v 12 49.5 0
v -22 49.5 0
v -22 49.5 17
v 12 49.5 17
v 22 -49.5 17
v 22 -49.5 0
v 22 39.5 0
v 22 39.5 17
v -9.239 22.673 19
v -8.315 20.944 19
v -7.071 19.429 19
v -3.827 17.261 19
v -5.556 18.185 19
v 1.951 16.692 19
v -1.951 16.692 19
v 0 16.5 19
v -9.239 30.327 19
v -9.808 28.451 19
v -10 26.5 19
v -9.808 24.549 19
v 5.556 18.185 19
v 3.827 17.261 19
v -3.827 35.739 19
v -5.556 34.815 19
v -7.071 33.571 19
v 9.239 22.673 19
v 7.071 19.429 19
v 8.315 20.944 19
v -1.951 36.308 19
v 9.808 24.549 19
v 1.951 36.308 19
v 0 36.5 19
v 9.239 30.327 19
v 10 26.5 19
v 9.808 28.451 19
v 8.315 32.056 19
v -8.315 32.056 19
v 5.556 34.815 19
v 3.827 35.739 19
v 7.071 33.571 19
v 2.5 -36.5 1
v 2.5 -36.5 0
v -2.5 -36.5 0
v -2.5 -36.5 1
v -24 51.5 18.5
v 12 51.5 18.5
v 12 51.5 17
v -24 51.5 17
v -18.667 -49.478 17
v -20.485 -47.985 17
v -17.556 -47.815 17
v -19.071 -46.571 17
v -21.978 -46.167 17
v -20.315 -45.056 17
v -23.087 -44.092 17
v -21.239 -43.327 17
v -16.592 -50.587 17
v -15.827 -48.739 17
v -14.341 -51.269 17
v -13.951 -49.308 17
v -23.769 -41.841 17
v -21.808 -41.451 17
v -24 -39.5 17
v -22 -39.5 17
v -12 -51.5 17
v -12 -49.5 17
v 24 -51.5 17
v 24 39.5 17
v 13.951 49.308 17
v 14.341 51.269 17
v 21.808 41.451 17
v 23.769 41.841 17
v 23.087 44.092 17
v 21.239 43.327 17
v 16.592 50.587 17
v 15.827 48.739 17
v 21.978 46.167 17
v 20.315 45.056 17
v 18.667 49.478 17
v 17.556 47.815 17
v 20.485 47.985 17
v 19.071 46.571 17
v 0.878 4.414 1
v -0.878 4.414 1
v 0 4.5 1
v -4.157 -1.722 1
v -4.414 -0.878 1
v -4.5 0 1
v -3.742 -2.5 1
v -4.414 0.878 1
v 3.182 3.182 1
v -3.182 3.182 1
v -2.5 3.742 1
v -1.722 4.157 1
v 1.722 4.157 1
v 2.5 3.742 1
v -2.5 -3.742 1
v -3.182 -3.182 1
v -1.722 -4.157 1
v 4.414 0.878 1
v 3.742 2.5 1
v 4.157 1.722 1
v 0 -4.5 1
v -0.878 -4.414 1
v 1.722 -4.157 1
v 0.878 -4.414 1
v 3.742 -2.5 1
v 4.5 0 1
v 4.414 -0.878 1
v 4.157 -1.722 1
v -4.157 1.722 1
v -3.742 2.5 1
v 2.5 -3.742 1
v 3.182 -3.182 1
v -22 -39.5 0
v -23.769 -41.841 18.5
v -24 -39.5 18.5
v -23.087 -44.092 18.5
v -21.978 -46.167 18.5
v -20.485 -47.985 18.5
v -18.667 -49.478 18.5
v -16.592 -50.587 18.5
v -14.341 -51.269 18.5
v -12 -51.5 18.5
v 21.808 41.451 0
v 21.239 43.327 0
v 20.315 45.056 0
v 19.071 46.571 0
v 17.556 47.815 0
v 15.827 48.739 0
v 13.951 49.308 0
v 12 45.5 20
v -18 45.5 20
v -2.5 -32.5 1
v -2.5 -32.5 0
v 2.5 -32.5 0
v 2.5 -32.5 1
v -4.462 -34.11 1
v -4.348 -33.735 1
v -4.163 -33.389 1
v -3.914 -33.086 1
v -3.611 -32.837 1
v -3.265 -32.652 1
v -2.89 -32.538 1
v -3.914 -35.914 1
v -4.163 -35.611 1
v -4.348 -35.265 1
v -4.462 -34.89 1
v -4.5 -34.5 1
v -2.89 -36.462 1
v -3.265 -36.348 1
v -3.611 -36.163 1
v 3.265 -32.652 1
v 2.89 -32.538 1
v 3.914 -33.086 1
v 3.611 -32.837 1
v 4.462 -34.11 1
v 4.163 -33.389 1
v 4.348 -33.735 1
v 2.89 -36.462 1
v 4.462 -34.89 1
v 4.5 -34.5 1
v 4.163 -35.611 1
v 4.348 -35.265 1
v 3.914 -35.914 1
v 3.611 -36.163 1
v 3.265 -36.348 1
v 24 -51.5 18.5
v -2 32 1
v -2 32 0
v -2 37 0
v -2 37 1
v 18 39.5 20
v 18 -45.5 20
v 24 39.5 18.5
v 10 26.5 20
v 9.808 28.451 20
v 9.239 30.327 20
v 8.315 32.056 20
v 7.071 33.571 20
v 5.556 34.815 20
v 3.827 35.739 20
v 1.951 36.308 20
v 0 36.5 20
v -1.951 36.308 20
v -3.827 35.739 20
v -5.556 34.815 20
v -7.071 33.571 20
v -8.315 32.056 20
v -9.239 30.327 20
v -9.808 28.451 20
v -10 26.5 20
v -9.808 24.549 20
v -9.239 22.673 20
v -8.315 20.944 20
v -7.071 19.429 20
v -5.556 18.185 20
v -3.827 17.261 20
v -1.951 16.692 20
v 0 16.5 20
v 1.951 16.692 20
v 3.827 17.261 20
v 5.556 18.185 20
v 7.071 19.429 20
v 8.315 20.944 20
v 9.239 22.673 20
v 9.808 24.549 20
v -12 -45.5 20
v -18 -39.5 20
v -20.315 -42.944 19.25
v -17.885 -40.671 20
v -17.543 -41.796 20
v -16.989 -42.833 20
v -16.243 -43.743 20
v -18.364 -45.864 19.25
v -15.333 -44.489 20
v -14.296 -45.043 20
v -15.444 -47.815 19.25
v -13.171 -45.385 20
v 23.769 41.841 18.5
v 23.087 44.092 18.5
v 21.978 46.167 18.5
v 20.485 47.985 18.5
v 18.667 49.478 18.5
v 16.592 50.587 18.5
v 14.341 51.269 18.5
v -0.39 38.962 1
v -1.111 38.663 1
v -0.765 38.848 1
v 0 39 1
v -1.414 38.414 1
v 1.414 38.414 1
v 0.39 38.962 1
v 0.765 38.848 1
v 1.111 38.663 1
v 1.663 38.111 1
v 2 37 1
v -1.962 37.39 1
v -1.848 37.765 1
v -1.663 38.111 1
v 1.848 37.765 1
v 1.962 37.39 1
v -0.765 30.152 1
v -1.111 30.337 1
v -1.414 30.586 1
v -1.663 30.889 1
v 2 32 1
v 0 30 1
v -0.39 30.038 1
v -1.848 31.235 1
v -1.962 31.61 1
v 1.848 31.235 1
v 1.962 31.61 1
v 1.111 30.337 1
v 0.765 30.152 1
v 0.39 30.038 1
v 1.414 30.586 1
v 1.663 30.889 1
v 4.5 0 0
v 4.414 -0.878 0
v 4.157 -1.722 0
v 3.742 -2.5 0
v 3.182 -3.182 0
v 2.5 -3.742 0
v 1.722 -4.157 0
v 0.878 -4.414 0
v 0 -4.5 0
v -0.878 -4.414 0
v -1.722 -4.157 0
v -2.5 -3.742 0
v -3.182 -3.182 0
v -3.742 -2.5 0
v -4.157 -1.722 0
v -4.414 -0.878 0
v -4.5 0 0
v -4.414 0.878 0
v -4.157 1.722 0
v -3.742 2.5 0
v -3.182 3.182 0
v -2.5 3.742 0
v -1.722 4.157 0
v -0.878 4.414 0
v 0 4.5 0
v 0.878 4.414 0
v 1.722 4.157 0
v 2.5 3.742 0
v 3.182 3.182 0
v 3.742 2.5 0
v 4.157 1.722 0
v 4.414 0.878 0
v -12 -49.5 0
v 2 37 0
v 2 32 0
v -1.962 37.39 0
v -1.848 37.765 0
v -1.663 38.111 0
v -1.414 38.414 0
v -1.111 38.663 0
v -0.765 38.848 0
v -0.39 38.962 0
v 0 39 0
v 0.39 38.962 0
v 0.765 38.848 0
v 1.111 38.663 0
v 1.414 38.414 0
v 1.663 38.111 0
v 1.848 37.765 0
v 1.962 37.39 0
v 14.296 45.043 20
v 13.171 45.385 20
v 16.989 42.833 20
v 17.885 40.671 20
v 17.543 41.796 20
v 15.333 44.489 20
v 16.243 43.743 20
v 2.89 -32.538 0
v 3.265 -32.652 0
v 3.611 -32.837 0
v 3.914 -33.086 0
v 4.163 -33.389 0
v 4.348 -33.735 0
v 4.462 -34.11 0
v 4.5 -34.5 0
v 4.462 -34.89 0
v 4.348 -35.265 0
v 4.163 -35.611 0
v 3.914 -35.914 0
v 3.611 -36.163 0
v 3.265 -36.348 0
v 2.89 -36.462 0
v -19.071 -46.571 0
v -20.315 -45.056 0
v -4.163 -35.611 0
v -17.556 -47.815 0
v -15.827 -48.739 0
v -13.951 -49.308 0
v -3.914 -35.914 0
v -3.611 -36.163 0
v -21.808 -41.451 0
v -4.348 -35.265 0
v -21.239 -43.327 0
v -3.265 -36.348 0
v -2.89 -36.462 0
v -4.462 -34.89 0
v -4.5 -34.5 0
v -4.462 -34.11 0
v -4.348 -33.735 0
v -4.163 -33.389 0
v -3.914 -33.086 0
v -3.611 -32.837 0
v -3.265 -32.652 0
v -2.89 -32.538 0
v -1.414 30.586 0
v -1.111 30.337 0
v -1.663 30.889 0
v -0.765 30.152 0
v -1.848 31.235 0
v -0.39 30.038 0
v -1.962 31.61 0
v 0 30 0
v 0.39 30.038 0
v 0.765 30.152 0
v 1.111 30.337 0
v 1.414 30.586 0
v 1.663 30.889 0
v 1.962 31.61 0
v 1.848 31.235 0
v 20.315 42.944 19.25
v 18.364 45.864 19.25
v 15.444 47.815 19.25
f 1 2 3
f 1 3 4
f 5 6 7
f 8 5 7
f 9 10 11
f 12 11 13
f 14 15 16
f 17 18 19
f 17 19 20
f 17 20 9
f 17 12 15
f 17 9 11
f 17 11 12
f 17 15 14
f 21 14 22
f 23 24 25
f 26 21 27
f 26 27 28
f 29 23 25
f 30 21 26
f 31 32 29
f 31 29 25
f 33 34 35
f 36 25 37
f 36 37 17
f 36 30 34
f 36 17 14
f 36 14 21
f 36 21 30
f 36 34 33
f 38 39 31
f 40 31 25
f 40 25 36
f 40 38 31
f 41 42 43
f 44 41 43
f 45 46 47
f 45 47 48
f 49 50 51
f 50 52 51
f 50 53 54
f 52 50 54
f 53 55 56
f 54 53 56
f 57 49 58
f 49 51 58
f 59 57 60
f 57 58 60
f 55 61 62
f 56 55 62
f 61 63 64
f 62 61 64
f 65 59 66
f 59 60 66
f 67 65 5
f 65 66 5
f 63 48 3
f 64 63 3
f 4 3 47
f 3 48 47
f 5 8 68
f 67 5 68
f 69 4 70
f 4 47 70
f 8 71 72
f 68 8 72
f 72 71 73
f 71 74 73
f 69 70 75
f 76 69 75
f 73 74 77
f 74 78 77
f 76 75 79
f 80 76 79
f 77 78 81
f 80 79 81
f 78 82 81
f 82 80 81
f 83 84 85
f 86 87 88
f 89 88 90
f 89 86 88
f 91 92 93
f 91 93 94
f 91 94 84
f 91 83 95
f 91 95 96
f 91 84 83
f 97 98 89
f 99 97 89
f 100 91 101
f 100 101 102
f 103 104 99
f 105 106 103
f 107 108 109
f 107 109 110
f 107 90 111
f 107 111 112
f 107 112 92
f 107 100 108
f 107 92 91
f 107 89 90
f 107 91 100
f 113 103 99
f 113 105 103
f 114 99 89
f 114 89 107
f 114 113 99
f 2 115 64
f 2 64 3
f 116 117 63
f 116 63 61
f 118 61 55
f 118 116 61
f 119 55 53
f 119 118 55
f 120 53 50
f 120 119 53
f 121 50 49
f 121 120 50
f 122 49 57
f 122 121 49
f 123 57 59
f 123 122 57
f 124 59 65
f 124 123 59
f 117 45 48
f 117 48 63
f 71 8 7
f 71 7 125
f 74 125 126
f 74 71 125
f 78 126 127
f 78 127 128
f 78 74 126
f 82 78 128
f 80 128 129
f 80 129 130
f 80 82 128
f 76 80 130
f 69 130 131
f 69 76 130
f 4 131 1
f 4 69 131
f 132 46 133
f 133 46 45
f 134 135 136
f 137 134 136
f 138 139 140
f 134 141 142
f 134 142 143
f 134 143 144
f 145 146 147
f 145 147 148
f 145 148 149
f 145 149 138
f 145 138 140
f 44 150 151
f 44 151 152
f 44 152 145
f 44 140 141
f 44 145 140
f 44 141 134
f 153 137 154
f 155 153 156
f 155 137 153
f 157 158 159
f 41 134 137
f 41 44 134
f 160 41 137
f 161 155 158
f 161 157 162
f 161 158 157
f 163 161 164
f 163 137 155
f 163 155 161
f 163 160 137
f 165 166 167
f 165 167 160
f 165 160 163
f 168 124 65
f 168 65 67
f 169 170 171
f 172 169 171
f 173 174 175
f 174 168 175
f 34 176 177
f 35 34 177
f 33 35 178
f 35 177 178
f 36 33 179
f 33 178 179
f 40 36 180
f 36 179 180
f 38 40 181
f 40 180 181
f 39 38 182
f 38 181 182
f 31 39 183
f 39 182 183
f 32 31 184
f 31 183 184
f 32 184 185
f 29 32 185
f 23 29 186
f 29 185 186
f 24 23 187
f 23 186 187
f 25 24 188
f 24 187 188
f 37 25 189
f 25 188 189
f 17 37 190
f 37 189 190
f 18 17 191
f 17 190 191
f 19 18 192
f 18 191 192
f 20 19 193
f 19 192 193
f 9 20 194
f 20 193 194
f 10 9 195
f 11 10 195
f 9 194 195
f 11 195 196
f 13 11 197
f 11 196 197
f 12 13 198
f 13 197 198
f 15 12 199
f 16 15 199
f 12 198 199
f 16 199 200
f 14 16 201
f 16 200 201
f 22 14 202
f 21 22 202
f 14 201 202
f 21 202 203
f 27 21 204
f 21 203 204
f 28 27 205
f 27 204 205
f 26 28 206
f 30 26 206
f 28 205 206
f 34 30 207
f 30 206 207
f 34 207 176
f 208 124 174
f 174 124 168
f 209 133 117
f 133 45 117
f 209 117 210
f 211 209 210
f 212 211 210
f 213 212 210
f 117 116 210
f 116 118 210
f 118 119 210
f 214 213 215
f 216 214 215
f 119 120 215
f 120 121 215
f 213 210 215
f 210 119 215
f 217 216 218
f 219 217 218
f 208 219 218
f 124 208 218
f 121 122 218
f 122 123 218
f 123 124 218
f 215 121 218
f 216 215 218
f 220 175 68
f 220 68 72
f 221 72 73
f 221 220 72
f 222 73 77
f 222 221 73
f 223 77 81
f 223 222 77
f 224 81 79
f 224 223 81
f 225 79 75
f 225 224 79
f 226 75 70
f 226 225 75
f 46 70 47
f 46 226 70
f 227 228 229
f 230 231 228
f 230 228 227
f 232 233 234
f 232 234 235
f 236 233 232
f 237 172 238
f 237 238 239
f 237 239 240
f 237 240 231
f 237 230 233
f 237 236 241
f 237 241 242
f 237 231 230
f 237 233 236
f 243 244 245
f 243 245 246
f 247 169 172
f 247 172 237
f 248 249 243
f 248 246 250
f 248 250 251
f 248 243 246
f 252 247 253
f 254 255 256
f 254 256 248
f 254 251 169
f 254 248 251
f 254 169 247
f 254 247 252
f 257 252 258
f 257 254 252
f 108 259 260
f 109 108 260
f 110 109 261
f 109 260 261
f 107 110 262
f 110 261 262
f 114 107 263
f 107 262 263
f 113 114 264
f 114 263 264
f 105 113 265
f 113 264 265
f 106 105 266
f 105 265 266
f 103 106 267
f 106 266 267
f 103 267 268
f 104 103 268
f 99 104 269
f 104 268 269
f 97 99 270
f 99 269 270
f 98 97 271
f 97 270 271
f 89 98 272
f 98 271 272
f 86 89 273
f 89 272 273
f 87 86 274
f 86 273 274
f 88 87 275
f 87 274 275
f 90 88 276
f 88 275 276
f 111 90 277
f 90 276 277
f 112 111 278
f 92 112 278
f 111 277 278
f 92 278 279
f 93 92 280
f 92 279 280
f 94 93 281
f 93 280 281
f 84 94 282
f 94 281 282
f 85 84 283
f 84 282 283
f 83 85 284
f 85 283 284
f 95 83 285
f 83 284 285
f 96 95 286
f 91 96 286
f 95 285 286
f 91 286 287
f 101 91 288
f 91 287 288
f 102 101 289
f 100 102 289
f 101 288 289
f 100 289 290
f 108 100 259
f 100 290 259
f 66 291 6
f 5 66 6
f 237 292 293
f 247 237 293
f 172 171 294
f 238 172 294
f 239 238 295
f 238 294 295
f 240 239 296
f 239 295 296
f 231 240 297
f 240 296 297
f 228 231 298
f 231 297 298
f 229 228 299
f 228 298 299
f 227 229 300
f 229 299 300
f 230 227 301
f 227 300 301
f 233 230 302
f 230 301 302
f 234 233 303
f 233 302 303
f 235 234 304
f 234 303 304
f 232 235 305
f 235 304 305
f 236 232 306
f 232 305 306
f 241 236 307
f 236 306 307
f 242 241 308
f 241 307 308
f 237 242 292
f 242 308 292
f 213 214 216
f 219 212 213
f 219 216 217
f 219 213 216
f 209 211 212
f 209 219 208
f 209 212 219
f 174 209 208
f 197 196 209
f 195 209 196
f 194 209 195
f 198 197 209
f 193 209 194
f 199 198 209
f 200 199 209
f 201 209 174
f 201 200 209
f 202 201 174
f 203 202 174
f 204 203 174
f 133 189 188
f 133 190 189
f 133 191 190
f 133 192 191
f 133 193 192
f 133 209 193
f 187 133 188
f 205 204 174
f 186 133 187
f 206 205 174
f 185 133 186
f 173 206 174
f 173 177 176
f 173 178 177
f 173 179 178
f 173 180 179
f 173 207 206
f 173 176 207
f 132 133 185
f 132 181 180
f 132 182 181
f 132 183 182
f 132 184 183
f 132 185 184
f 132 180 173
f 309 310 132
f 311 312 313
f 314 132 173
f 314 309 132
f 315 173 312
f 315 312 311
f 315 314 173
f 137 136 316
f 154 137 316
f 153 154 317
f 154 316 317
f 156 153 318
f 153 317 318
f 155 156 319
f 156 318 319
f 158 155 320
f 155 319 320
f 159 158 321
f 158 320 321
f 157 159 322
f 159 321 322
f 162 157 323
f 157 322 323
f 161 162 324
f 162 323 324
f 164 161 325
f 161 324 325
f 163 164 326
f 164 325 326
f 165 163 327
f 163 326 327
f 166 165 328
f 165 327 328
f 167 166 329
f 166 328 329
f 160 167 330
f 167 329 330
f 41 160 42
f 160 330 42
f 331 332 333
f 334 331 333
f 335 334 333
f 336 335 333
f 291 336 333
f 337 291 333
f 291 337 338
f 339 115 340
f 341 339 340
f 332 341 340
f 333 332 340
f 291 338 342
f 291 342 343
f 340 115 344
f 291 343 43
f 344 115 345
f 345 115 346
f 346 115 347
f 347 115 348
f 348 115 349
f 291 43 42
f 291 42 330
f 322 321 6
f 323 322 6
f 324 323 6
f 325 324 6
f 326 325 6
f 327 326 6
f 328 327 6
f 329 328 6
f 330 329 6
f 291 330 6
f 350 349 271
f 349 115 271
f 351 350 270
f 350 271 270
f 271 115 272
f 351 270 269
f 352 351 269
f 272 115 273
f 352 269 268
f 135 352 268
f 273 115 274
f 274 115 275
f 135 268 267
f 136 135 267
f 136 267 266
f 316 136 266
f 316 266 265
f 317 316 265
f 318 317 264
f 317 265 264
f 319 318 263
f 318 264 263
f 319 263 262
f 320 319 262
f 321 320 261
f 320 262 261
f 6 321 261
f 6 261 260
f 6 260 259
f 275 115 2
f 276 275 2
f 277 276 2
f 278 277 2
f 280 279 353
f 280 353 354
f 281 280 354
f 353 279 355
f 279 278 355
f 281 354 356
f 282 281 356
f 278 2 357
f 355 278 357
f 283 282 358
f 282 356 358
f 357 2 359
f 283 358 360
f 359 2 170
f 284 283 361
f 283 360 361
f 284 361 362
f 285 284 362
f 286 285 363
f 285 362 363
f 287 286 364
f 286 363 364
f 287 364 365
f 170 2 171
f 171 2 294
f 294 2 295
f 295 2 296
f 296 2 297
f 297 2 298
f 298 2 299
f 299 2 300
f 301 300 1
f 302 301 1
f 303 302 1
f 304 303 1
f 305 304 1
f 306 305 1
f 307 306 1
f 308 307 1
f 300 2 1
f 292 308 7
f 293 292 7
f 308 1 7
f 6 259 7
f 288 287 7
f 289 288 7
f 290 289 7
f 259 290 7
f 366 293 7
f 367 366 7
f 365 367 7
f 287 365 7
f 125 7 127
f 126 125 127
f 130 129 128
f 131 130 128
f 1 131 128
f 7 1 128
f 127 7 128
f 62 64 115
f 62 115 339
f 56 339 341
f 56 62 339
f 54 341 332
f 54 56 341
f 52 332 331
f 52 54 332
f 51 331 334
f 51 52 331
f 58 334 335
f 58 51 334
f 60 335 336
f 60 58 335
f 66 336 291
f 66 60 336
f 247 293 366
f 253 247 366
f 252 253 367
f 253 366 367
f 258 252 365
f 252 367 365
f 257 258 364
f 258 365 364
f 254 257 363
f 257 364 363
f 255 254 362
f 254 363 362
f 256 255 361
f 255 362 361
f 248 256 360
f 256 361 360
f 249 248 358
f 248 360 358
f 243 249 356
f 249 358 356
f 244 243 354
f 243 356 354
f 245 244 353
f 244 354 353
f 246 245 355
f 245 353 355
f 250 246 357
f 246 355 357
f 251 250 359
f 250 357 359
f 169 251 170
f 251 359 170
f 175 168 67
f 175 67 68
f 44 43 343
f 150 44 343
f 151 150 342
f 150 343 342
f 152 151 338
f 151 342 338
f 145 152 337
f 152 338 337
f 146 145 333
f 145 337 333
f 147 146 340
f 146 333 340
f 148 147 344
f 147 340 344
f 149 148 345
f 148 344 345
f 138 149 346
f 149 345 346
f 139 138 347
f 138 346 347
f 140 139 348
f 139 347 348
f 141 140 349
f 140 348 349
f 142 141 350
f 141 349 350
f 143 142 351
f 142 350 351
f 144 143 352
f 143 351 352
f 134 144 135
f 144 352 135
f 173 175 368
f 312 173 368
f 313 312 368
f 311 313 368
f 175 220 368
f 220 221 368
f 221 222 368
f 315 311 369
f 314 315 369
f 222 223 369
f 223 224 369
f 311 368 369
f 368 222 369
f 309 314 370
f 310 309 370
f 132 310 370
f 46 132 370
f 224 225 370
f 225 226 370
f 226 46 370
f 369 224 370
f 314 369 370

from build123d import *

# Parameters (mm, degrees)
F0_W     = 44
F0_H     = 99
F1_DEPTH = 20
F2_R     = 10
F4_DEPTH = 3
F5_SIZE2 = 1.5
F5_SIZE  = 6
F6_R     = 10
F7_DEPTH = 1
F8_R     = 4.5
F9_DEPTH = 1


with BuildPart() as f1:
    # F0 (on Top) → F1 (new body)
    with BuildSketch(Plane.XY):
        Rectangle(F0_W, F0_H)
    extrude(amount=F1_DEPTH)

    # F2
    f2_edges = [f1.edges().sort_by_distance(p)[0] for p in [
        (22, 49.5, 10),
        (-22, -49.5, 10),
    ]]
    fillet(f2_edges, radius=F2_R)

    # F3 (on face) → F4 (join)
    with BuildSketch(Plane.XY.offset(20)):
        with BuildLine():
            ThreePointArc((24, 39.5), (20.4852813742, 47.9852813742), (12, 51.5))
            Line((12, 51.5), (-24, 51.5))
            Line((-24, 51.5), (-24, -39.5))
            ThreePointArc((-24, -39.5), (-20.4852813742, -47.9852813742), (-12, -51.5))
            Line((-12, -51.5), (24, -51.5))
            Line((24, -51.5), (24, 39.5))
        make_face()
    extrude(amount=-F4_DEPTH)

    # F5
    f5_edges = [f1.edges().sort_by_distance(p)[0] for p in [
        (20.485281, 47.985281, 20),
        (-6, 51.5, 20),
        (-24, 6, 20),
        (-20.485281, -47.985281, 20),
        (6, -51.5, 20),
        (24, -6, 20),
    ]]
    f5_side = f1.faces().sort_by_distance((0, 0, 20))[0]
    chamfer(f5_edges, length=F5_SIZE, length2=F5_SIZE2, reference=f5_side)

    # F6 (on face) → F7 (cut)
    with BuildSketch(Plane.XY.offset(20)):
        with Locations((0, 26.5)):
            Circle(F6_R)
    extrude(amount=-F7_DEPTH, mode=Mode.SUBTRACT)

    # F8 (on face) → F9 (cut)
    with BuildSketch(Plane(origin=(0, 0, 0), x_dir=(1, 0, 0), z_dir=(0, 0, -1))):
        Circle(F8_R)
        with BuildLine():
            Line((-2, -32), (-2, -37))
            ThreePointArc((-2, -37), (0, -39), (2, -37))
            Line((2, -37), (2, -32))
            ThreePointArc((2, -32), (0, -30), (-2, -32))
        make_face()
        with BuildLine():
            Line((2.5, 36.5), (-2.5, 36.5))
            ThreePointArc((-2.5, 36.5), (-4.5, 34.5), (-2.5, 32.5))
            Line((-2.5, 32.5), (2.5, 32.5))
            ThreePointArc((2.5, 32.5), (4.5, 34.5), (2.5, 36.5))
        make_face()
    extrude(amount=-F9_DEPTH, mode=Mode.SUBTRACT)


solid = f1.part
